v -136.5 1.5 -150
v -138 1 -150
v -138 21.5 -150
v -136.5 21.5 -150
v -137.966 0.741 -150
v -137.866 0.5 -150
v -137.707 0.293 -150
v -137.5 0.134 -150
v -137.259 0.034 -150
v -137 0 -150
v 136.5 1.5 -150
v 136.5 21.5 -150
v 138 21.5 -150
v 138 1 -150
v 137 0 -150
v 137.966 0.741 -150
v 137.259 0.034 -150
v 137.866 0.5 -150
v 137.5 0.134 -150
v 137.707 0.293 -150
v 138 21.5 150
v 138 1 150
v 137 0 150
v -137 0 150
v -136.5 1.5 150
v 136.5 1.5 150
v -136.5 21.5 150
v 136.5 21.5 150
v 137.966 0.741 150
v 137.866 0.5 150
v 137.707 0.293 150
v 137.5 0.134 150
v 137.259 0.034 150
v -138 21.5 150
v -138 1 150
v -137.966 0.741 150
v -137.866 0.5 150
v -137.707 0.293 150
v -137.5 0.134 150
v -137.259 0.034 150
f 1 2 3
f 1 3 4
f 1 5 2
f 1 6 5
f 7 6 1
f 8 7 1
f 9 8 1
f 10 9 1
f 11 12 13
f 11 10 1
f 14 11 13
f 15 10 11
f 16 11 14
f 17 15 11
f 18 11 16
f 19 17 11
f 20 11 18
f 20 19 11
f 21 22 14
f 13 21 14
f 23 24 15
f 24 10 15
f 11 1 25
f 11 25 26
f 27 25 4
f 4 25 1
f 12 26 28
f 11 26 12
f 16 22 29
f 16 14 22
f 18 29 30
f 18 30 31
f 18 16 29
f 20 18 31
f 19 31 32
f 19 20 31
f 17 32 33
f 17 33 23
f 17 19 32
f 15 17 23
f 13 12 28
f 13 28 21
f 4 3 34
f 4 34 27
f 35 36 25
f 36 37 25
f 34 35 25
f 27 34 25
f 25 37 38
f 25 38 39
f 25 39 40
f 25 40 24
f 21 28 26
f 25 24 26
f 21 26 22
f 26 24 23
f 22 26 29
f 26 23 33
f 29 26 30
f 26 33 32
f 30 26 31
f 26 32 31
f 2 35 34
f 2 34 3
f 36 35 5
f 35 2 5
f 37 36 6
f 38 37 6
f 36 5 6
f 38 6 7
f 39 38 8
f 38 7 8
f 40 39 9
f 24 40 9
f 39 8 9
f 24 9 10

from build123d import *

# Parameters (mm, degrees)
SKETCH1_W           = 276
SKETCH1_H           = 300
BOSS_EXTRUDE1_DEPTH = 1.5
SKETCH2_W           = 1.5
SKETCH2_H           = 300
BOSS_EXTRUDE2_DEPTH = 20
FILLET1_R           = 1


with BuildPart() as part:
    # Sketch1 → Boss-Extrude1 (new body)
    with BuildSketch(Plane(origin=(0, 0, 0), x_dir=(1, 0, 0), z_dir=(0, 1, 0))):
        Rectangle(SKETCH1_W, SKETCH1_H)
    extrude(amount=BOSS_EXTRUDE1_DEPTH)

    # Sketch2 → Boss-Extrude2 (add)
    with BuildSketch(Plane(origin=(0, 1.5, 0), x_dir=(1, 0, 0), z_dir=(0, 1, 0))):
        with Locations((-137.25, 0)):
            Rectangle(SKETCH2_W, SKETCH2_H)
        with Locations((137.25, 0)):
            Rectangle(SKETCH2_W, SKETCH2_H)
    extrude(amount=BOSS_EXTRUDE2_DEPTH)

    # Fillet1
    fillet1_edges = [part.edges().sort_by_distance(p)[0] for p in [
        (-138, 0, 0),
        (138, 0, 0),
    ]]
    fillet(fillet1_edges, radius=FILLET1_R)


solid = part.part
